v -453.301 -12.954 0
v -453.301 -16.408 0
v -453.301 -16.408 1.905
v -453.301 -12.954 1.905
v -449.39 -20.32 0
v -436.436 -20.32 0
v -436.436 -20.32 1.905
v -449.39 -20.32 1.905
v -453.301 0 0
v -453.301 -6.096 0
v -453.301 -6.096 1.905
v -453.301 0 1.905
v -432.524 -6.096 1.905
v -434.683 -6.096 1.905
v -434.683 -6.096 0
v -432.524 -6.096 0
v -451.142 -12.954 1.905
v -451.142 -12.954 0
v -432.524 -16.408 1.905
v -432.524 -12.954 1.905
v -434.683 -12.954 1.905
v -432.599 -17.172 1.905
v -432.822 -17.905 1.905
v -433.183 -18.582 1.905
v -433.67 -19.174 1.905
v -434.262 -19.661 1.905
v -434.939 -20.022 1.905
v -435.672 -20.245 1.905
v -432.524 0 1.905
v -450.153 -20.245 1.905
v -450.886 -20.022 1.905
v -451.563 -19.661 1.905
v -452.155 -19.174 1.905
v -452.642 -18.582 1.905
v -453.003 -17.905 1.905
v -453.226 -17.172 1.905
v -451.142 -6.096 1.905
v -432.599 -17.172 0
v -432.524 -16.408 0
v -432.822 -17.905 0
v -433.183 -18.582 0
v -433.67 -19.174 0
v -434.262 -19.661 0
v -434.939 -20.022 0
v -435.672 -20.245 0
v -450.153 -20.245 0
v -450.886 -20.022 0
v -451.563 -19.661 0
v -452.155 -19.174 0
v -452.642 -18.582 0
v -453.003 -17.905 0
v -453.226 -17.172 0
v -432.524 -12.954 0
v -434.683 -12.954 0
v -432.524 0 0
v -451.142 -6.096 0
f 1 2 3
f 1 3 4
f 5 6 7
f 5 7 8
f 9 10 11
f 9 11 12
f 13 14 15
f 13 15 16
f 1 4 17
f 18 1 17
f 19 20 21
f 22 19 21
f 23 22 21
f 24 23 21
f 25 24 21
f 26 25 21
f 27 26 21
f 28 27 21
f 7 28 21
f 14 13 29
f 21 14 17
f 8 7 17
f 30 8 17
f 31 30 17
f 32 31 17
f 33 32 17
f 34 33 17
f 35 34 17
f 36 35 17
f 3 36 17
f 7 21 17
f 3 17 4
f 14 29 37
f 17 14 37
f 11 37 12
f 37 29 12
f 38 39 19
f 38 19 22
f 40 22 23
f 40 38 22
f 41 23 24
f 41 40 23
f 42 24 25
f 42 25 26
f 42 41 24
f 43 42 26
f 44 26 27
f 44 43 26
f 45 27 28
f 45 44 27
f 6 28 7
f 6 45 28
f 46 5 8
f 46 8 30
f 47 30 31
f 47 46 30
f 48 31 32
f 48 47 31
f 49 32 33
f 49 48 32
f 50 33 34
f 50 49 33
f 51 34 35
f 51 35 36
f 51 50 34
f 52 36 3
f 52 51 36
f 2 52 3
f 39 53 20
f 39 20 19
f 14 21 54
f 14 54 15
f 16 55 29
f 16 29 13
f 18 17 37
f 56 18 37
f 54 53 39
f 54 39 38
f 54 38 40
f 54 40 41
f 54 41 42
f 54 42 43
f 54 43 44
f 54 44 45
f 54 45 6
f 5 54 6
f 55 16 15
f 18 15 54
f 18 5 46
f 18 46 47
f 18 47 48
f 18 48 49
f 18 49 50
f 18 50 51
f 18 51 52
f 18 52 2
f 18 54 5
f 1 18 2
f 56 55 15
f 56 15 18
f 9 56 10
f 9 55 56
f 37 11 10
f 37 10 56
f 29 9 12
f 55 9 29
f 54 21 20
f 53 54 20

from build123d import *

# Parameters (mm, degrees)
BOSS_EXTRUDE1_DEPTH = 1.905
SKETCH2_W           = 2.413
SKETCH2_H           = 6.858
CUT_EXTRUDE1_DEPTH  = 454.76030973


with BuildPart() as part:
    # Sketch1 → Boss-Extrude1 (new body)
    with BuildSketch(Plane.XY):
        with BuildLine():
            Line((-434.4289, 0), (-432.5239, 0))
            Line((-432.5239, 0), (-432.5239, -6.35))
            Line((-432.5239, -6.35), (-432.5239, -12.7))
            Line((-432.5239, -12.7), (-432.5239, -16.4084))
            ThreePointArc((-432.5239, -16.4084), (-433.669581115, -19.174318885), (-436.4355, -20.32))
            Line((-436.4355, -20.32), (-449.3895, -20.32))
            ThreePointArc((-449.3895, -20.32), (-452.155418885, -19.174318885), (-453.3011, -16.4084))
            Line((-453.3011, -16.4084), (-453.3011, -12.7))
            Line((-453.3011, -12.7), (-453.3011, -6.35))
            Line((-453.3011, -6.35), (-453.3011, 0))
            Line((-453.3011, 0), (-451.3961, 0))
            Line((-451.3961, 0), (-434.4289, 0))
        make_face()
    extrude(amount=BOSS_EXTRUDE1_DEPTH)

    # Sketch2 → Cut-Extrude1 (cut, through all)
    with BuildSketch(Plane.XY.offset(1.905)):
        with Locations((-433.4764, -9.525)):
            Rectangle(SKETCH2_W, SKETCH2_H)
        with Locations((-452.3486, -9.525)):
            Rectangle(SKETCH2_W, SKETCH2_H)
    extrude(amount=-CUT_EXTRUDE1_DEPTH, mode=Mode.SUBTRACT)


solid = part.part
